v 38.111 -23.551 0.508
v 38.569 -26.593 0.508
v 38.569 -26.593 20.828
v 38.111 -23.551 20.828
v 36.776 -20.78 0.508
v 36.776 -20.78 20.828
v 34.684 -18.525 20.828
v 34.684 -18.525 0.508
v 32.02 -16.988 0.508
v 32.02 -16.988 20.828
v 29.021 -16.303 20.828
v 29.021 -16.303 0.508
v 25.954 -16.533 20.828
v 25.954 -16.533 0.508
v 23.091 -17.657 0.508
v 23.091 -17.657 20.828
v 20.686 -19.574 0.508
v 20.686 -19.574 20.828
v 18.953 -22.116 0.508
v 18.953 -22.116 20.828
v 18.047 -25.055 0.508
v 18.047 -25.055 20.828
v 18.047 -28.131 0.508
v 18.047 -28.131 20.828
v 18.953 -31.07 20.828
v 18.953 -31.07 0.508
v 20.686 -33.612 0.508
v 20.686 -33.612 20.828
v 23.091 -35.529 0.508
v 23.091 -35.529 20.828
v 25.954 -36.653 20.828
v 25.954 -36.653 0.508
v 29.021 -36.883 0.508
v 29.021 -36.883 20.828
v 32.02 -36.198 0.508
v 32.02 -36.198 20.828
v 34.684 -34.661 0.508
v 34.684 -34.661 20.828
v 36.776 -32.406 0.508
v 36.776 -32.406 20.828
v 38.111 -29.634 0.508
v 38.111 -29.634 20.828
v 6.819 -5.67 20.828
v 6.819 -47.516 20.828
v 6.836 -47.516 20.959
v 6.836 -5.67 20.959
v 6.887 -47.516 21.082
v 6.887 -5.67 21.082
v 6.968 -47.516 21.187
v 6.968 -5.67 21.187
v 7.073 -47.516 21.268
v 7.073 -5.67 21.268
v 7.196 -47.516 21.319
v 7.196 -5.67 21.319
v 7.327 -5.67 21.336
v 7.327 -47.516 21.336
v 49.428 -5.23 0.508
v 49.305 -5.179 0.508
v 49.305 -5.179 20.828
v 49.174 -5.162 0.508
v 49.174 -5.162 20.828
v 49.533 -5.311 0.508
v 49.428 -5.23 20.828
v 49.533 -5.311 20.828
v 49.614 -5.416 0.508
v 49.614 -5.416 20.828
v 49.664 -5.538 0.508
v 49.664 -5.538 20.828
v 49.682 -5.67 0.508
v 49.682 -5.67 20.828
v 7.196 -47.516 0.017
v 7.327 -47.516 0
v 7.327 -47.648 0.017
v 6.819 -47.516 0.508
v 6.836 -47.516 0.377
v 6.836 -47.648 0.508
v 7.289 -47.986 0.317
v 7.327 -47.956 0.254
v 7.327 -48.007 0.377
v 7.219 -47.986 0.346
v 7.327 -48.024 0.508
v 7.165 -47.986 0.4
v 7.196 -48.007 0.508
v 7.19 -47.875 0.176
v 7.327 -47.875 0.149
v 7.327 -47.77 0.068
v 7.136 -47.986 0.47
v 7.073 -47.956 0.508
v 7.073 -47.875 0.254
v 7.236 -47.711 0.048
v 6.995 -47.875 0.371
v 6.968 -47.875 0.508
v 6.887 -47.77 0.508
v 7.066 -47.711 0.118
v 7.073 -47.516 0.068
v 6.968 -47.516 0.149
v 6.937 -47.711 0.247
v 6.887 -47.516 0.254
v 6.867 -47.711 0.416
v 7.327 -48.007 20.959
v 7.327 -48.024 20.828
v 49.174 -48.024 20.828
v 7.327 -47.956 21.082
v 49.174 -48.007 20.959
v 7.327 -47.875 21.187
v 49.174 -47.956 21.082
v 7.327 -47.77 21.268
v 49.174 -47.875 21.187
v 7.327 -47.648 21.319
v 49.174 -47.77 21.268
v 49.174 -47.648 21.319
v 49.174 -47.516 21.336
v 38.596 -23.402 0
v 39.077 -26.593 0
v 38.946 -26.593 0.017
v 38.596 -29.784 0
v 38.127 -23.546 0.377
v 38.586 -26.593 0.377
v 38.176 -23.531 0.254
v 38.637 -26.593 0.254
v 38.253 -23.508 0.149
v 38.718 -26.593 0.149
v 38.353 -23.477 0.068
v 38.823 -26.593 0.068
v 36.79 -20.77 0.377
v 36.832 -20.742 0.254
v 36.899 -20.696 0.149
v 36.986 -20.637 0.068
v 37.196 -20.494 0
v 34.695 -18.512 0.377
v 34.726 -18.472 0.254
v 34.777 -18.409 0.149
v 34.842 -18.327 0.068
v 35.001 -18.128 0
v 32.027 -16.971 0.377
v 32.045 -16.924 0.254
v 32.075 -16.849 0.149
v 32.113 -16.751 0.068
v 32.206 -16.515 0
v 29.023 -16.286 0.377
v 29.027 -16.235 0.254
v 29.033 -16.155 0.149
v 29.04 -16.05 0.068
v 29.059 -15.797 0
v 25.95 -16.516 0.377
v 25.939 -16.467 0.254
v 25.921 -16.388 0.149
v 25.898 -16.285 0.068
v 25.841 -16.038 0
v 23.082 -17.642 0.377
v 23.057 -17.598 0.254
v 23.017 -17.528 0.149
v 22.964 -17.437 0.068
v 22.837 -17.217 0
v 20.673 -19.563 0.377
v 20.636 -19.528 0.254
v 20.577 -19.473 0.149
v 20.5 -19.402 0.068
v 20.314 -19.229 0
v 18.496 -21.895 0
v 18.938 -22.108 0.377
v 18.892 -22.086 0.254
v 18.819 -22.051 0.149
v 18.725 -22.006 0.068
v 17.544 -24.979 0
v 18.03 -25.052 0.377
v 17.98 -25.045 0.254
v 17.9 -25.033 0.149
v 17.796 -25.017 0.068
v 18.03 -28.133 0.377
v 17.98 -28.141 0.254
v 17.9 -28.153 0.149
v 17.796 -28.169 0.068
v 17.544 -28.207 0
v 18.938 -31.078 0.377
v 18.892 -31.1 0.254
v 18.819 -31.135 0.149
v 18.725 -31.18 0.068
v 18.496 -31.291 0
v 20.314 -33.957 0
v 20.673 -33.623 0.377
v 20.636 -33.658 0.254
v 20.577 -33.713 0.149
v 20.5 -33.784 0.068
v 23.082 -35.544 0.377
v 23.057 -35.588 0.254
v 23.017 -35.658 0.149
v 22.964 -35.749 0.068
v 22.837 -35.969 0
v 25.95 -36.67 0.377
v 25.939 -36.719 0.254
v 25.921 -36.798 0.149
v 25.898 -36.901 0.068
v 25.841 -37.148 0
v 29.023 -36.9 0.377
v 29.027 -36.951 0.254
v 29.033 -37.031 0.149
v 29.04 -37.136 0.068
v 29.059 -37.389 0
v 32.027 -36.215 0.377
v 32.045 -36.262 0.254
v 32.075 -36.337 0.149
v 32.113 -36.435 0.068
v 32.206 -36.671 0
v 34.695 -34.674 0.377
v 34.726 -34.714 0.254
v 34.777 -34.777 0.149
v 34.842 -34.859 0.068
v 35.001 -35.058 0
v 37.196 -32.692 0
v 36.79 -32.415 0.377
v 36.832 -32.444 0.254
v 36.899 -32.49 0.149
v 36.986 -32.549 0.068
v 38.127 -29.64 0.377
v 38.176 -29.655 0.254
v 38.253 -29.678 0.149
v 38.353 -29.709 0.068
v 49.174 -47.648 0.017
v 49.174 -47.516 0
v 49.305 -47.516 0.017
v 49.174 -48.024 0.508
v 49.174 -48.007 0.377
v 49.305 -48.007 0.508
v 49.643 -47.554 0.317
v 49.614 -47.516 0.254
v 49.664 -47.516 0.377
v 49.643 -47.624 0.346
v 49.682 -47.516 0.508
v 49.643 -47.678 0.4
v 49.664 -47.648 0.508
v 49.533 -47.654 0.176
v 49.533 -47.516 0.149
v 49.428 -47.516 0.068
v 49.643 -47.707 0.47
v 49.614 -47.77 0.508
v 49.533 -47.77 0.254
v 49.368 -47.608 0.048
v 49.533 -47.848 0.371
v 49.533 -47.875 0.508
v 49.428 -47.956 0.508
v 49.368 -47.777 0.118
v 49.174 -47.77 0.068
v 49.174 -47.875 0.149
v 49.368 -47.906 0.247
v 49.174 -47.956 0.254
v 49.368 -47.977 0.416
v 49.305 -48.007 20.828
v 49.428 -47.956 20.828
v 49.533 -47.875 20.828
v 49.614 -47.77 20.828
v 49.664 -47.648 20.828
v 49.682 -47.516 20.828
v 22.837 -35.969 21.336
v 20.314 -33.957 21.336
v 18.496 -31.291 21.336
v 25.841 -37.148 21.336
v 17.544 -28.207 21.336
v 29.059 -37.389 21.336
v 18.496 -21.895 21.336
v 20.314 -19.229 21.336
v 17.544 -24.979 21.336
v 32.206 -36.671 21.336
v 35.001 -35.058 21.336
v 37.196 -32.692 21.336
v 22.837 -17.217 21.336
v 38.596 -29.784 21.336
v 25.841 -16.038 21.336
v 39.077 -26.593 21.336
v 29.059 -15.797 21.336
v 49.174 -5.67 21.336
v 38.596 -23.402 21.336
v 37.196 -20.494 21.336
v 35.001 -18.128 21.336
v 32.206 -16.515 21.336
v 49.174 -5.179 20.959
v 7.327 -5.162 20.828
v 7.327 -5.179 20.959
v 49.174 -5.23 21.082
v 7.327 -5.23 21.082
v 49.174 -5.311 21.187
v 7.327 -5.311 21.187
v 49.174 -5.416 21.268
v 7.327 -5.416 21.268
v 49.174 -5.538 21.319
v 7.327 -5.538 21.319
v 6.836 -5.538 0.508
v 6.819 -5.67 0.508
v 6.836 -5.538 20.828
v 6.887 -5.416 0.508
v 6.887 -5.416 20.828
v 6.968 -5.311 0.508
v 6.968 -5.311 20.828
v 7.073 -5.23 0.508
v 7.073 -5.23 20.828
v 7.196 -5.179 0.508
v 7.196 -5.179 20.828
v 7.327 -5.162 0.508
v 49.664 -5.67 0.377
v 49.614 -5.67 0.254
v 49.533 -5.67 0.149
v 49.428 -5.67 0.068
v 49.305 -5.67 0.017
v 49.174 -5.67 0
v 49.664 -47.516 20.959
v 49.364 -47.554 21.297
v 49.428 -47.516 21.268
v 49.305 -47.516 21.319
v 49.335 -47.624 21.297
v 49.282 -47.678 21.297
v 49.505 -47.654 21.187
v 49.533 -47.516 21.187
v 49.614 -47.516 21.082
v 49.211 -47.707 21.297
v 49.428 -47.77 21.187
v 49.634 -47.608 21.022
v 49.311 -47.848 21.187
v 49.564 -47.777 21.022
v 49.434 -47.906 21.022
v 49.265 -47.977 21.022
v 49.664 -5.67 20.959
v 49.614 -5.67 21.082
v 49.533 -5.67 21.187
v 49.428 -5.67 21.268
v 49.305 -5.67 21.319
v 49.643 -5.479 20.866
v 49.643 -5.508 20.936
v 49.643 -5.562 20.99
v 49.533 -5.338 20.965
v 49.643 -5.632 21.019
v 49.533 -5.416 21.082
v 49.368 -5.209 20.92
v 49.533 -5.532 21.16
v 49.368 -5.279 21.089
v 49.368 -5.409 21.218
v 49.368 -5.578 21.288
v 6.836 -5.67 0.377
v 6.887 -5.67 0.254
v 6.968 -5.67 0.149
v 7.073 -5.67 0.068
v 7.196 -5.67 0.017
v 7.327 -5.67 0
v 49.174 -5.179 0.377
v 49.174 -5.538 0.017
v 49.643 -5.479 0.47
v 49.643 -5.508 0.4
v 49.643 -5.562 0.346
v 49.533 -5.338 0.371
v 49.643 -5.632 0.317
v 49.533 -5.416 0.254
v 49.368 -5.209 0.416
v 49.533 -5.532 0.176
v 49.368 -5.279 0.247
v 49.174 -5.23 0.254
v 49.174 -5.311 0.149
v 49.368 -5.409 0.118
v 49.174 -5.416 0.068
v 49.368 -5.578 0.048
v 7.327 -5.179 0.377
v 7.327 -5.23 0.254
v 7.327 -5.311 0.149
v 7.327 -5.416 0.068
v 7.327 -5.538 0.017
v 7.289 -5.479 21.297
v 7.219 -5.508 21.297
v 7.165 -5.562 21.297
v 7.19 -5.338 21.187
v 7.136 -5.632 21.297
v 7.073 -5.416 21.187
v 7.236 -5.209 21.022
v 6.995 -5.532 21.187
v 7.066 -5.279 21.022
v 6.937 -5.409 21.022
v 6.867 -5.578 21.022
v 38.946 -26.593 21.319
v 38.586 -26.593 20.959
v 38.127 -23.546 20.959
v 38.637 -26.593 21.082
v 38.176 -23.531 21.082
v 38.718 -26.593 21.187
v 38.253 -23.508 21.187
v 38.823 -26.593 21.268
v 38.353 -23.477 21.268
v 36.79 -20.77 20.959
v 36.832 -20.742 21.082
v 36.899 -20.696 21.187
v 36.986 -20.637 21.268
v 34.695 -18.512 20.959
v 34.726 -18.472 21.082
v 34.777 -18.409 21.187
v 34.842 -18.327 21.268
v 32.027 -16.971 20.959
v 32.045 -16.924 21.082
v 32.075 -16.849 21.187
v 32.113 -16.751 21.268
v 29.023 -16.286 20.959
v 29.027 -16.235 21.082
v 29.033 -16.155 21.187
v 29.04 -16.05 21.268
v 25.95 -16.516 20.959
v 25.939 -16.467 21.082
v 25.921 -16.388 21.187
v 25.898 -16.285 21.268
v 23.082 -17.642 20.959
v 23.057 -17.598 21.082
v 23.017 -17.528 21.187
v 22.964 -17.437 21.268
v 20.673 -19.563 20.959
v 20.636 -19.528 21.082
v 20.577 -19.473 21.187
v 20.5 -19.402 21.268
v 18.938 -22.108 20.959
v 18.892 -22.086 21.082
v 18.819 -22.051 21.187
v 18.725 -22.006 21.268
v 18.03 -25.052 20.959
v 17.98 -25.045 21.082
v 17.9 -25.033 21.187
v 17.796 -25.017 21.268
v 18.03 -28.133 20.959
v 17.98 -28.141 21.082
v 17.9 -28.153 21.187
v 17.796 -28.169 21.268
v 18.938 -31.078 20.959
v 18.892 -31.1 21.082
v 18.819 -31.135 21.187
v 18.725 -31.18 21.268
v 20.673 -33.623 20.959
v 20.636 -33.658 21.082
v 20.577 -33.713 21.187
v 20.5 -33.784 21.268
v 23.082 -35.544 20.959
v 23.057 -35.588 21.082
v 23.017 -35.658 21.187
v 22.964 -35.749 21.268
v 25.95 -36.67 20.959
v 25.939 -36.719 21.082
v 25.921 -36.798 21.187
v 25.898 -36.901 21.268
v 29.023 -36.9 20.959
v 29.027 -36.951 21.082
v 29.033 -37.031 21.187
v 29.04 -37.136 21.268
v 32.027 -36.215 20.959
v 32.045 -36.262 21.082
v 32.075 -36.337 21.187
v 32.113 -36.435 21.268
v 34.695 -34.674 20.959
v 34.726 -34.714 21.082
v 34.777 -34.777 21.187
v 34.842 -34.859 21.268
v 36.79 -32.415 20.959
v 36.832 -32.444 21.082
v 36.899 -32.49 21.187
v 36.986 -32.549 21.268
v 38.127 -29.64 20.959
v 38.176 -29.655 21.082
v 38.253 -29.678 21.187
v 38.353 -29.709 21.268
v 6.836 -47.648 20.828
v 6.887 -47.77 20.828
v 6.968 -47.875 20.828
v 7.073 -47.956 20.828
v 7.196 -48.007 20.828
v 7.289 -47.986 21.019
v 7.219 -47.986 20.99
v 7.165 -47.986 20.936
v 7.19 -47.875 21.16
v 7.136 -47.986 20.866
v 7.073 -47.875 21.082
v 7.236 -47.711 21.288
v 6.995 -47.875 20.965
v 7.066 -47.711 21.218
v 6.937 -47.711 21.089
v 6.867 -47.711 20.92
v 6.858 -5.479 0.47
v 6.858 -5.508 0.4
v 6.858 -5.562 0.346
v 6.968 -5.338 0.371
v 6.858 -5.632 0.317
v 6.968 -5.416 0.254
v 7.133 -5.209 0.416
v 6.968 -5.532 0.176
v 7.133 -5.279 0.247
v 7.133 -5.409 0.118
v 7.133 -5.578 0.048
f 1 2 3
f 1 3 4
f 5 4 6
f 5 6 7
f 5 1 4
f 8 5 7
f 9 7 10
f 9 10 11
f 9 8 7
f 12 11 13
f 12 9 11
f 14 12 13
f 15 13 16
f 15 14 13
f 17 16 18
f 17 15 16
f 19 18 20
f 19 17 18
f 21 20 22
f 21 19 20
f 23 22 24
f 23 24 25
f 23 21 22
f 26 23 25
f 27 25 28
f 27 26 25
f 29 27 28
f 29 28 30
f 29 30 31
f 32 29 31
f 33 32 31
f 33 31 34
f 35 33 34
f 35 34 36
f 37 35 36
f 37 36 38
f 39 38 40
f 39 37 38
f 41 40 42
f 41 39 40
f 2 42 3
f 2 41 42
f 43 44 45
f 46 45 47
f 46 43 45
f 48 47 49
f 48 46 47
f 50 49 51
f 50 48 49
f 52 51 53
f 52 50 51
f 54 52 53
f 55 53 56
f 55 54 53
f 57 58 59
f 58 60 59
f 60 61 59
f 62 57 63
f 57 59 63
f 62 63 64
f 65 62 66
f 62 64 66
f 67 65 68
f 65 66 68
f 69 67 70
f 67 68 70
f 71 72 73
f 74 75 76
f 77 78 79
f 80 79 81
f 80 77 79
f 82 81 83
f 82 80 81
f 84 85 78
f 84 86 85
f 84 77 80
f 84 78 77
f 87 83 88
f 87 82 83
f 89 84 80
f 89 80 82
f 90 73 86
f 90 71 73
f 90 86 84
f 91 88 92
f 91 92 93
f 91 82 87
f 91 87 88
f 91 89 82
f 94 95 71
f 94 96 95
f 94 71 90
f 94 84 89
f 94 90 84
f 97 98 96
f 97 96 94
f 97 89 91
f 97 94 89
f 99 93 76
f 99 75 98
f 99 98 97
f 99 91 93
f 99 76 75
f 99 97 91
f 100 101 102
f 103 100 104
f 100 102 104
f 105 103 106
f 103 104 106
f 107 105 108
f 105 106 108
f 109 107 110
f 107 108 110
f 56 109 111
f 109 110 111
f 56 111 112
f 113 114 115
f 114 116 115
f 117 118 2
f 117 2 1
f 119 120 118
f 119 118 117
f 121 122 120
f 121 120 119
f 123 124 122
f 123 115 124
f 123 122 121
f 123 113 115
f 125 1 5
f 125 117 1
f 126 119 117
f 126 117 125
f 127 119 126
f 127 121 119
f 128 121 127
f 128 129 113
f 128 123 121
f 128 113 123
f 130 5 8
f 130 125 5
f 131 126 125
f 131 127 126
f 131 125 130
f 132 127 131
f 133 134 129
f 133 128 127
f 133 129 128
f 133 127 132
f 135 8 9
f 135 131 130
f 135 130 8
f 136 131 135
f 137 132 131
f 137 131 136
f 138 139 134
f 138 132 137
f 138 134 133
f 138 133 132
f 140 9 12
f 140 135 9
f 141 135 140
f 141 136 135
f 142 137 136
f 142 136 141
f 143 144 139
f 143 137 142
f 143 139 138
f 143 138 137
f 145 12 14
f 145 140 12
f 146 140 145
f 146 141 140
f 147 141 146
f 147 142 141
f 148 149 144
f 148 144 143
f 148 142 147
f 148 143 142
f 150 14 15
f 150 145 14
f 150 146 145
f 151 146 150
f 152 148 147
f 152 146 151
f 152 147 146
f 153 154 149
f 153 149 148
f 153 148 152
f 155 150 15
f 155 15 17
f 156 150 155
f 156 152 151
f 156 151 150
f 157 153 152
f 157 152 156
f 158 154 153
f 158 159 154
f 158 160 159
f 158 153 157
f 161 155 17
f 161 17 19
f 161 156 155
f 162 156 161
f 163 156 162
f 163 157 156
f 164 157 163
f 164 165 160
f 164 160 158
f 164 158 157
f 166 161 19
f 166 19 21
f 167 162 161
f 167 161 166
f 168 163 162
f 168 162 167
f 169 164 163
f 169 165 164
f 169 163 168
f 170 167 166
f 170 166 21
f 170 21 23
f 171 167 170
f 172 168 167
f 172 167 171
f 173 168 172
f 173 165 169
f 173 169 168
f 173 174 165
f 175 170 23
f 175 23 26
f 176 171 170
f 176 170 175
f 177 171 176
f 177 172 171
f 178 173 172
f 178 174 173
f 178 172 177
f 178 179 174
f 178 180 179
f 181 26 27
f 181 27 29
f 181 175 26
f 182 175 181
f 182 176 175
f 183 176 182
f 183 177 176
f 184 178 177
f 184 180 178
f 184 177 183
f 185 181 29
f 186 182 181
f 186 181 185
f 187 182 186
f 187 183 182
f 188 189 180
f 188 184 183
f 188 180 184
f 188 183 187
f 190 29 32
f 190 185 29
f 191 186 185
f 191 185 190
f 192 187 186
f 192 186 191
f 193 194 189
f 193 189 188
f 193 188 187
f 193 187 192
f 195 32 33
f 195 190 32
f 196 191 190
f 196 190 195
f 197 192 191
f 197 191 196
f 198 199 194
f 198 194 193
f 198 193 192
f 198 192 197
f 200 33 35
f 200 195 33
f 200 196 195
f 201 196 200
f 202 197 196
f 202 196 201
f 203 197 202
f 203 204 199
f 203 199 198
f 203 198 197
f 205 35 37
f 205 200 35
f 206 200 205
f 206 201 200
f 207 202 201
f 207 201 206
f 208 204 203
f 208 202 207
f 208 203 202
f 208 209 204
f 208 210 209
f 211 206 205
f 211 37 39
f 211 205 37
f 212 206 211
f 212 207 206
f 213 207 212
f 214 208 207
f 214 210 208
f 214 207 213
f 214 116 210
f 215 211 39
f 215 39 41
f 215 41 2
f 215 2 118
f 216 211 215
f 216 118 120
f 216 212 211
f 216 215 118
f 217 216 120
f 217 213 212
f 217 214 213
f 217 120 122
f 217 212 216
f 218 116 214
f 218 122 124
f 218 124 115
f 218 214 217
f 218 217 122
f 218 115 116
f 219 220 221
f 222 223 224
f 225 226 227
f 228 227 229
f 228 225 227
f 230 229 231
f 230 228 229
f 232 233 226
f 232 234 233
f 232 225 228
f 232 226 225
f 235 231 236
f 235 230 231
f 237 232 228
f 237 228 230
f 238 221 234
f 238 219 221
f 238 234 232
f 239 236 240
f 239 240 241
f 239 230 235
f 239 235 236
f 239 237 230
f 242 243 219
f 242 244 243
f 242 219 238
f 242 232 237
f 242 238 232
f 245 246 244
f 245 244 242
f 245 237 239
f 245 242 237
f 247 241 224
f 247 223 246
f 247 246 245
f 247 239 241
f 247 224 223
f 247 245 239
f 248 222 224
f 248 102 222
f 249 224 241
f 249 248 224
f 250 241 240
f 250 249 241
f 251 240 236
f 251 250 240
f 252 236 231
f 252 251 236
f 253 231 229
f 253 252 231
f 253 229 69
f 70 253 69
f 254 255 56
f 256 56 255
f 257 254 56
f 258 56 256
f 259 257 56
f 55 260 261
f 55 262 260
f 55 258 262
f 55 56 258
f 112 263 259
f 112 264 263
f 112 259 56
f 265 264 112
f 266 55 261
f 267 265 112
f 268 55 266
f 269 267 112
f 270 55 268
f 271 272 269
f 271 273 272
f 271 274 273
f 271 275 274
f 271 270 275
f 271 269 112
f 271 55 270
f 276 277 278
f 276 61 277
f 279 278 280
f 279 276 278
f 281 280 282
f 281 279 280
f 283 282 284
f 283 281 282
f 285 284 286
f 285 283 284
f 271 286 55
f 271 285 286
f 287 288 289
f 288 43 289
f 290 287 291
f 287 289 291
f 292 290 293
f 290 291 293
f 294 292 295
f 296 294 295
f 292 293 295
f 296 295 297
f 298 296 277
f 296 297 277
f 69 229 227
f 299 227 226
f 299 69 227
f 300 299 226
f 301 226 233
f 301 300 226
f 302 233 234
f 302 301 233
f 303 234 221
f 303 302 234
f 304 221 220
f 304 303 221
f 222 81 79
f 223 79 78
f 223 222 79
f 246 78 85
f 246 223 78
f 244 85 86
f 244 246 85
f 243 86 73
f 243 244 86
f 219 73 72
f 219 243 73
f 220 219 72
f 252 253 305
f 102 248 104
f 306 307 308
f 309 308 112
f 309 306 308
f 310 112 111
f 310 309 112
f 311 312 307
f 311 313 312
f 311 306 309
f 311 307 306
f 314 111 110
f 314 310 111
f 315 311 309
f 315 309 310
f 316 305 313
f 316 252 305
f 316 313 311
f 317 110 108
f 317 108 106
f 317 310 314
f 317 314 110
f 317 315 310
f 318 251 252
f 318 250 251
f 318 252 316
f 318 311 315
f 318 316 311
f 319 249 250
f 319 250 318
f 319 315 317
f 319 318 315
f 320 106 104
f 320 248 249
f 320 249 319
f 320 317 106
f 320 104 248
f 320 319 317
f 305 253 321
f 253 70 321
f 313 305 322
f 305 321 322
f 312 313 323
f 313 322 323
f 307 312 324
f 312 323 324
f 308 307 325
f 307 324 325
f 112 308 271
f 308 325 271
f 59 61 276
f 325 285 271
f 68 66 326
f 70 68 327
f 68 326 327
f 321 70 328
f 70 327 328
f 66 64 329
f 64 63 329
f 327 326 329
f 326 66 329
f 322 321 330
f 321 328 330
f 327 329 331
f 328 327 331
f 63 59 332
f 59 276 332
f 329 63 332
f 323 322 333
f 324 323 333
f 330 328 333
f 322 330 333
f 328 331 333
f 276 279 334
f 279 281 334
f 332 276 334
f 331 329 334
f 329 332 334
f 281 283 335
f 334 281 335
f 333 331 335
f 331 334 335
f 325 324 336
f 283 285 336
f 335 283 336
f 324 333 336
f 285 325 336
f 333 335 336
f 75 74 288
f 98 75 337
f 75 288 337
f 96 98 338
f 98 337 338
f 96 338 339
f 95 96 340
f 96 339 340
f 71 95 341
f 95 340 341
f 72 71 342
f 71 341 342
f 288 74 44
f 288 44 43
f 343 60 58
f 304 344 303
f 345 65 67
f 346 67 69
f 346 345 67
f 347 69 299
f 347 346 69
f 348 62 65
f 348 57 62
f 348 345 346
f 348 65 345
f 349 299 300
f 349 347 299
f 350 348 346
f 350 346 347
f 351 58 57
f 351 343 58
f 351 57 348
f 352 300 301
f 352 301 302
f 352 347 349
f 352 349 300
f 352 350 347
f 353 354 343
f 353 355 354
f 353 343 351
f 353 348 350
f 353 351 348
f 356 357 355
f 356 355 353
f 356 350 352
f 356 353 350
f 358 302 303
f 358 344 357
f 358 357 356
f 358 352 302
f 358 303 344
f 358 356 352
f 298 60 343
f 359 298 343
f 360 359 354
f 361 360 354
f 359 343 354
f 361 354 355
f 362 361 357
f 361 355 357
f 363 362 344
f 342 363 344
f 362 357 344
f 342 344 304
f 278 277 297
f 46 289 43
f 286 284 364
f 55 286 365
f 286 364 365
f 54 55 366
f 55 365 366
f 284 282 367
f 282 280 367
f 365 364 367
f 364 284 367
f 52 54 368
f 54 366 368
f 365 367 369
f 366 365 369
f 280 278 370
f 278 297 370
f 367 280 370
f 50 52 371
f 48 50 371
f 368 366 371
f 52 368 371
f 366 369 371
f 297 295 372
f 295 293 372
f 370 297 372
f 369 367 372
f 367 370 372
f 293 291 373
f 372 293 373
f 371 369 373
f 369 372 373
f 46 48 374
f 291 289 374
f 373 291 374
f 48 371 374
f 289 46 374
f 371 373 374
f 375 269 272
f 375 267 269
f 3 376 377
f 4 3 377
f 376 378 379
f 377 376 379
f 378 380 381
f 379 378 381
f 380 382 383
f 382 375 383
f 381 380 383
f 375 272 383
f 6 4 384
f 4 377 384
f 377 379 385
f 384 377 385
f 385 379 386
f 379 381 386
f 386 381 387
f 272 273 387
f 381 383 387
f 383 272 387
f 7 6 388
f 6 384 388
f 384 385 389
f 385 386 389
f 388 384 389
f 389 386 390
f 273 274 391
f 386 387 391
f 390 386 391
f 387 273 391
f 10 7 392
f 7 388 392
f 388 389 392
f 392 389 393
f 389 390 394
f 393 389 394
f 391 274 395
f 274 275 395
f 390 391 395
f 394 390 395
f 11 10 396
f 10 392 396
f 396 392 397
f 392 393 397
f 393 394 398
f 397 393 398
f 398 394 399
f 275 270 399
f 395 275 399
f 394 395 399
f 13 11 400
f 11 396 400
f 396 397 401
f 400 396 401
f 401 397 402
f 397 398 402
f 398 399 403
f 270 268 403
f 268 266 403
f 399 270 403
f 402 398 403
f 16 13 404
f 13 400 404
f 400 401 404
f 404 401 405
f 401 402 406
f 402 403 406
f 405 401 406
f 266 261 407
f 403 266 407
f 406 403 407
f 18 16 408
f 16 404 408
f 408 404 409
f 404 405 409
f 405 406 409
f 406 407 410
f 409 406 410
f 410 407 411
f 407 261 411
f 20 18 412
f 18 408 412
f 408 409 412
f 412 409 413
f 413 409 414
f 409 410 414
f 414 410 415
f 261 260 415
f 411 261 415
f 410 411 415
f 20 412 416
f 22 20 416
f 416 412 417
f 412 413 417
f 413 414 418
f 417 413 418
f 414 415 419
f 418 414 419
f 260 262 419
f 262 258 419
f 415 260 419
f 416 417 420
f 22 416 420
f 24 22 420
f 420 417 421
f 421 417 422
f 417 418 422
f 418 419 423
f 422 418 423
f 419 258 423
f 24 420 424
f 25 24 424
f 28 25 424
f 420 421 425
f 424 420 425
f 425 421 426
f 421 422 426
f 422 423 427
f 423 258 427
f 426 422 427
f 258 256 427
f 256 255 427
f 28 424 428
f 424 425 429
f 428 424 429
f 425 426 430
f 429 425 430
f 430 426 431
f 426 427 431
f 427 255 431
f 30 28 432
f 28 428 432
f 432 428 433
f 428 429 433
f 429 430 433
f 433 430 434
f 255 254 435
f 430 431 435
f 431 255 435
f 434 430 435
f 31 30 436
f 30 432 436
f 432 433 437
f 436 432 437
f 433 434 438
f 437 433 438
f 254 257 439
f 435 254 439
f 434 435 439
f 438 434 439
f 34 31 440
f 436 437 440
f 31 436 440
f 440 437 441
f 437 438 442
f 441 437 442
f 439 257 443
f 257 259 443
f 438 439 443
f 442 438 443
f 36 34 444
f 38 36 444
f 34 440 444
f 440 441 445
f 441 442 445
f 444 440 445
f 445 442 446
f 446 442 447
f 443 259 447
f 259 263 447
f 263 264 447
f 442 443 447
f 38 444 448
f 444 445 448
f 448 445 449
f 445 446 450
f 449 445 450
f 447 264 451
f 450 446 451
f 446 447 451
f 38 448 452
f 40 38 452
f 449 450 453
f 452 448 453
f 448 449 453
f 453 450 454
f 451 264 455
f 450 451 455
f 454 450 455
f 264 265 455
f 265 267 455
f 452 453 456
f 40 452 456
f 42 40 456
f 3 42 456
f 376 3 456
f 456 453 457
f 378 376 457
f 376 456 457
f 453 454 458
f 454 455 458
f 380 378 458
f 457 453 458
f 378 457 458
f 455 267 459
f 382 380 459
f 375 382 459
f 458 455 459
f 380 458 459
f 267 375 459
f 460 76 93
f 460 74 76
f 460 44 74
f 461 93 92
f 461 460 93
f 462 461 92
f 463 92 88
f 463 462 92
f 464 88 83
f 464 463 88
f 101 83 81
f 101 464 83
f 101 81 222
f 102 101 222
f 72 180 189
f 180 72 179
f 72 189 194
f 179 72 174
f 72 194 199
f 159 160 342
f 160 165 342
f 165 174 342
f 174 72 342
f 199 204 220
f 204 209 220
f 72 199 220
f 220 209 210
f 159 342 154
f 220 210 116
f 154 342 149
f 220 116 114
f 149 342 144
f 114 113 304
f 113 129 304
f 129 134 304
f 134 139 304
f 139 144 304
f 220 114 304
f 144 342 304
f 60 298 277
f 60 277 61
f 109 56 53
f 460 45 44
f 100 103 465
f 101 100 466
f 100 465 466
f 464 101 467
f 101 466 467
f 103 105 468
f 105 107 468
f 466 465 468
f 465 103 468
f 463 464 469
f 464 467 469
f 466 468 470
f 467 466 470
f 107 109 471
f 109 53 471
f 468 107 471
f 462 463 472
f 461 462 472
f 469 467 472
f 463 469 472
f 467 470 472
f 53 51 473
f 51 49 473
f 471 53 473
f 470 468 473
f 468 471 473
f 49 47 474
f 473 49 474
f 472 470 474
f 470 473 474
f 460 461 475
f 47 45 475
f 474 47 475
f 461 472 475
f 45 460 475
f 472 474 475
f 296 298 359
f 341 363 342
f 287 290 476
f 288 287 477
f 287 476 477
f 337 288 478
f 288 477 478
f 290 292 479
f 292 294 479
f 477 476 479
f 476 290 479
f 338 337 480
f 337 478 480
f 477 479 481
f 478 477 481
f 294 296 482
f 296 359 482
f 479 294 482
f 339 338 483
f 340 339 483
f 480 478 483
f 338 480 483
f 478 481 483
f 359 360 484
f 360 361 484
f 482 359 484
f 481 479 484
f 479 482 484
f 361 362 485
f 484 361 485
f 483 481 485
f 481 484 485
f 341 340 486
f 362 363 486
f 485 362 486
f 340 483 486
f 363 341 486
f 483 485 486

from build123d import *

# Parameters (mm, degrees)
F0_W     = 42.8625
F0_H     = 42.8625
F0_R     = 10.31875
F1_DEPTH = 21.336
F2_R     = 0.508


with BuildPart() as f1:
    # F0 (on Top) → F1 (new body)
    with BuildSketch(Plane.XY):
        with Locations((28.250322, -26.592983)):
            Rectangle(F0_W, F0_H)
        with Locations((28.250322, -26.592983)):
            Circle(F0_R, mode=Mode.SUBTRACT)
    extrude(amount=F1_DEPTH)

    # F2
    f2_edges = [f1.edges().sort_by_distance(p)[0] for p in [
        (28.250322, -5.161733, 0),
        (6.819072, -5.161733, 10.668),
        (28.250322, -5.161733, 21.336),
        (49.681572, -5.161733, 10.668),
        (6.819072, -26.592983, 0),
        (28.250322, -48.024233, 0),
        (49.681572, -26.592983, 0),
        (17.931572, -26.592983, 0),
        (49.681572, -48.024233, 10.668),
        (49.681572, -26.592983, 21.336),
        (6.819072, -26.592983, 21.336),
        (28.250322, -48.024233, 21.336),
        (17.931572, -26.592983, 21.336),
        (6.819072, -48.024233, 10.668),
    ]]
    fillet(f2_edges, radius=F2_R)


solid = f1.part
